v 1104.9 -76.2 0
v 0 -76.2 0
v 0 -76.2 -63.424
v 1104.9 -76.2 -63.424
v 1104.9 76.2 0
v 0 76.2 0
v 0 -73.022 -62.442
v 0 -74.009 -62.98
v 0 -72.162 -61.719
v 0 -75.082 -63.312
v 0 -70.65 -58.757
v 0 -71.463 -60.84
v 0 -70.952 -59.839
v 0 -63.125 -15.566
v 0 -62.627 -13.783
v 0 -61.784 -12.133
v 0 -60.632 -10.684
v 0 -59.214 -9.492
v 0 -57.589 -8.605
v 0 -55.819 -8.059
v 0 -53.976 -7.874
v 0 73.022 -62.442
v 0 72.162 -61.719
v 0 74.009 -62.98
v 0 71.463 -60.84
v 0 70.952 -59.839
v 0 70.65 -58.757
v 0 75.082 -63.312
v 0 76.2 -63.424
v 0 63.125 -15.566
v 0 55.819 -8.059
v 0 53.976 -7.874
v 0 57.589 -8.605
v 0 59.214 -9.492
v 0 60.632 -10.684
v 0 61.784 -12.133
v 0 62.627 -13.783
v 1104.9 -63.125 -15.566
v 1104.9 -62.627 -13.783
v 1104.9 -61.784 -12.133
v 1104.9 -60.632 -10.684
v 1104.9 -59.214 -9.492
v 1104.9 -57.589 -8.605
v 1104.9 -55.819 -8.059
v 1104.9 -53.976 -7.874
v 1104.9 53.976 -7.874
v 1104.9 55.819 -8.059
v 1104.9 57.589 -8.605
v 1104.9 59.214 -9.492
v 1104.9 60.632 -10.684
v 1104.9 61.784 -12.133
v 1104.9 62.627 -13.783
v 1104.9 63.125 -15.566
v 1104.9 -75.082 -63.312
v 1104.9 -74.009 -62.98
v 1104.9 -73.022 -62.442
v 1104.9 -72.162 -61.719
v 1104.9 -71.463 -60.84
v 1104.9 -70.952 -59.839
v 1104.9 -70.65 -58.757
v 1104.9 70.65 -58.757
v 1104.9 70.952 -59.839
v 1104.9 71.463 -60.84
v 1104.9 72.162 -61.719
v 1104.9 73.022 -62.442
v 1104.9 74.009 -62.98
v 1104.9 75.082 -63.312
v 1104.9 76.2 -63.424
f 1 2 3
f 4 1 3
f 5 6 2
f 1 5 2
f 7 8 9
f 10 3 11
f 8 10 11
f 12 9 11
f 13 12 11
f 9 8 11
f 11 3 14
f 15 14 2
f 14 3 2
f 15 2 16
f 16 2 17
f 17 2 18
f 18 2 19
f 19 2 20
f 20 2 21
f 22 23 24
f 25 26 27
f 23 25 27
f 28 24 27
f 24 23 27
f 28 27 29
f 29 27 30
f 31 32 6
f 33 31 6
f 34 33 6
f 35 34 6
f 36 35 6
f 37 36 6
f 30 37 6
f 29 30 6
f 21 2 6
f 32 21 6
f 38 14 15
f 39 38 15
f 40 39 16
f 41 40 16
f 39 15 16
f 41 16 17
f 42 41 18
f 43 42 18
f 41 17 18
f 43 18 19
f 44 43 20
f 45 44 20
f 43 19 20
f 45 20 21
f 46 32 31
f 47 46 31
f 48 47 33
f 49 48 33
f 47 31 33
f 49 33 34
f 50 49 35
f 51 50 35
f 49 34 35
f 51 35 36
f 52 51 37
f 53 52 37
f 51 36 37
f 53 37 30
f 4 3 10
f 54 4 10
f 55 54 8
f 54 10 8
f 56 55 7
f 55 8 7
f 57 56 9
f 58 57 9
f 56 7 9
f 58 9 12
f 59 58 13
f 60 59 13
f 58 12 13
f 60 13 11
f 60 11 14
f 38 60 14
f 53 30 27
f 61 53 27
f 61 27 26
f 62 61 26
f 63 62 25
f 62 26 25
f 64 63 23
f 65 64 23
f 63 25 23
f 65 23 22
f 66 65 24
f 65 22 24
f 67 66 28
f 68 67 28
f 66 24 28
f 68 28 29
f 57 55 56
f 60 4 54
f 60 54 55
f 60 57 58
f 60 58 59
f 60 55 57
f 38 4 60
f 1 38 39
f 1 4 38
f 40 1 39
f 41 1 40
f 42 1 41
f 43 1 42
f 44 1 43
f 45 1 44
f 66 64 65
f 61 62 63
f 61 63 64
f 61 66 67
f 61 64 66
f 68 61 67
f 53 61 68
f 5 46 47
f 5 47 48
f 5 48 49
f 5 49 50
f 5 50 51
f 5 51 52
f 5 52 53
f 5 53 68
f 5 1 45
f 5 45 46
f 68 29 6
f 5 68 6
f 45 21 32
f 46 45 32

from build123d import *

# Parameters (mm, degrees)
F1_DEPTH = 1104.9


with BuildPart() as f1:
    # F0 (on Right) → F1 (new body)
    with BuildSketch(Plane.YZ):
        with BuildLine():
            Line((76.2, 0), (-76.2, 0))
            Line((-76.2, 0), (-76.2, -63.4238))
            ThreePointArc((-76.2, -63.4238), (-72.574321, -62.102069), (-70.649887, -58.757061))
            Line((-70.649887, -58.757061), (-63.124886, -15.566335))
            ThreePointArc((-63.124886, -15.566335), (-59.952782, -10.052651), (-53.976459, -7.874))
            Line((-53.976459, -7.874), (53.976459, -7.874))
            ThreePointArc((53.976459, -7.874), (59.952782, -10.052651), (63.124886, -15.566335))
            Line((63.124886, -15.566335), (70.649887, -58.757061))
            ThreePointArc((70.649887, -58.757061), (72.574321, -62.102069), (76.2, -63.4238))
            Line((76.2, -63.4238), (76.2, 0))
        make_face()
    extrude(amount=F1_DEPTH)


solid = f1.part
